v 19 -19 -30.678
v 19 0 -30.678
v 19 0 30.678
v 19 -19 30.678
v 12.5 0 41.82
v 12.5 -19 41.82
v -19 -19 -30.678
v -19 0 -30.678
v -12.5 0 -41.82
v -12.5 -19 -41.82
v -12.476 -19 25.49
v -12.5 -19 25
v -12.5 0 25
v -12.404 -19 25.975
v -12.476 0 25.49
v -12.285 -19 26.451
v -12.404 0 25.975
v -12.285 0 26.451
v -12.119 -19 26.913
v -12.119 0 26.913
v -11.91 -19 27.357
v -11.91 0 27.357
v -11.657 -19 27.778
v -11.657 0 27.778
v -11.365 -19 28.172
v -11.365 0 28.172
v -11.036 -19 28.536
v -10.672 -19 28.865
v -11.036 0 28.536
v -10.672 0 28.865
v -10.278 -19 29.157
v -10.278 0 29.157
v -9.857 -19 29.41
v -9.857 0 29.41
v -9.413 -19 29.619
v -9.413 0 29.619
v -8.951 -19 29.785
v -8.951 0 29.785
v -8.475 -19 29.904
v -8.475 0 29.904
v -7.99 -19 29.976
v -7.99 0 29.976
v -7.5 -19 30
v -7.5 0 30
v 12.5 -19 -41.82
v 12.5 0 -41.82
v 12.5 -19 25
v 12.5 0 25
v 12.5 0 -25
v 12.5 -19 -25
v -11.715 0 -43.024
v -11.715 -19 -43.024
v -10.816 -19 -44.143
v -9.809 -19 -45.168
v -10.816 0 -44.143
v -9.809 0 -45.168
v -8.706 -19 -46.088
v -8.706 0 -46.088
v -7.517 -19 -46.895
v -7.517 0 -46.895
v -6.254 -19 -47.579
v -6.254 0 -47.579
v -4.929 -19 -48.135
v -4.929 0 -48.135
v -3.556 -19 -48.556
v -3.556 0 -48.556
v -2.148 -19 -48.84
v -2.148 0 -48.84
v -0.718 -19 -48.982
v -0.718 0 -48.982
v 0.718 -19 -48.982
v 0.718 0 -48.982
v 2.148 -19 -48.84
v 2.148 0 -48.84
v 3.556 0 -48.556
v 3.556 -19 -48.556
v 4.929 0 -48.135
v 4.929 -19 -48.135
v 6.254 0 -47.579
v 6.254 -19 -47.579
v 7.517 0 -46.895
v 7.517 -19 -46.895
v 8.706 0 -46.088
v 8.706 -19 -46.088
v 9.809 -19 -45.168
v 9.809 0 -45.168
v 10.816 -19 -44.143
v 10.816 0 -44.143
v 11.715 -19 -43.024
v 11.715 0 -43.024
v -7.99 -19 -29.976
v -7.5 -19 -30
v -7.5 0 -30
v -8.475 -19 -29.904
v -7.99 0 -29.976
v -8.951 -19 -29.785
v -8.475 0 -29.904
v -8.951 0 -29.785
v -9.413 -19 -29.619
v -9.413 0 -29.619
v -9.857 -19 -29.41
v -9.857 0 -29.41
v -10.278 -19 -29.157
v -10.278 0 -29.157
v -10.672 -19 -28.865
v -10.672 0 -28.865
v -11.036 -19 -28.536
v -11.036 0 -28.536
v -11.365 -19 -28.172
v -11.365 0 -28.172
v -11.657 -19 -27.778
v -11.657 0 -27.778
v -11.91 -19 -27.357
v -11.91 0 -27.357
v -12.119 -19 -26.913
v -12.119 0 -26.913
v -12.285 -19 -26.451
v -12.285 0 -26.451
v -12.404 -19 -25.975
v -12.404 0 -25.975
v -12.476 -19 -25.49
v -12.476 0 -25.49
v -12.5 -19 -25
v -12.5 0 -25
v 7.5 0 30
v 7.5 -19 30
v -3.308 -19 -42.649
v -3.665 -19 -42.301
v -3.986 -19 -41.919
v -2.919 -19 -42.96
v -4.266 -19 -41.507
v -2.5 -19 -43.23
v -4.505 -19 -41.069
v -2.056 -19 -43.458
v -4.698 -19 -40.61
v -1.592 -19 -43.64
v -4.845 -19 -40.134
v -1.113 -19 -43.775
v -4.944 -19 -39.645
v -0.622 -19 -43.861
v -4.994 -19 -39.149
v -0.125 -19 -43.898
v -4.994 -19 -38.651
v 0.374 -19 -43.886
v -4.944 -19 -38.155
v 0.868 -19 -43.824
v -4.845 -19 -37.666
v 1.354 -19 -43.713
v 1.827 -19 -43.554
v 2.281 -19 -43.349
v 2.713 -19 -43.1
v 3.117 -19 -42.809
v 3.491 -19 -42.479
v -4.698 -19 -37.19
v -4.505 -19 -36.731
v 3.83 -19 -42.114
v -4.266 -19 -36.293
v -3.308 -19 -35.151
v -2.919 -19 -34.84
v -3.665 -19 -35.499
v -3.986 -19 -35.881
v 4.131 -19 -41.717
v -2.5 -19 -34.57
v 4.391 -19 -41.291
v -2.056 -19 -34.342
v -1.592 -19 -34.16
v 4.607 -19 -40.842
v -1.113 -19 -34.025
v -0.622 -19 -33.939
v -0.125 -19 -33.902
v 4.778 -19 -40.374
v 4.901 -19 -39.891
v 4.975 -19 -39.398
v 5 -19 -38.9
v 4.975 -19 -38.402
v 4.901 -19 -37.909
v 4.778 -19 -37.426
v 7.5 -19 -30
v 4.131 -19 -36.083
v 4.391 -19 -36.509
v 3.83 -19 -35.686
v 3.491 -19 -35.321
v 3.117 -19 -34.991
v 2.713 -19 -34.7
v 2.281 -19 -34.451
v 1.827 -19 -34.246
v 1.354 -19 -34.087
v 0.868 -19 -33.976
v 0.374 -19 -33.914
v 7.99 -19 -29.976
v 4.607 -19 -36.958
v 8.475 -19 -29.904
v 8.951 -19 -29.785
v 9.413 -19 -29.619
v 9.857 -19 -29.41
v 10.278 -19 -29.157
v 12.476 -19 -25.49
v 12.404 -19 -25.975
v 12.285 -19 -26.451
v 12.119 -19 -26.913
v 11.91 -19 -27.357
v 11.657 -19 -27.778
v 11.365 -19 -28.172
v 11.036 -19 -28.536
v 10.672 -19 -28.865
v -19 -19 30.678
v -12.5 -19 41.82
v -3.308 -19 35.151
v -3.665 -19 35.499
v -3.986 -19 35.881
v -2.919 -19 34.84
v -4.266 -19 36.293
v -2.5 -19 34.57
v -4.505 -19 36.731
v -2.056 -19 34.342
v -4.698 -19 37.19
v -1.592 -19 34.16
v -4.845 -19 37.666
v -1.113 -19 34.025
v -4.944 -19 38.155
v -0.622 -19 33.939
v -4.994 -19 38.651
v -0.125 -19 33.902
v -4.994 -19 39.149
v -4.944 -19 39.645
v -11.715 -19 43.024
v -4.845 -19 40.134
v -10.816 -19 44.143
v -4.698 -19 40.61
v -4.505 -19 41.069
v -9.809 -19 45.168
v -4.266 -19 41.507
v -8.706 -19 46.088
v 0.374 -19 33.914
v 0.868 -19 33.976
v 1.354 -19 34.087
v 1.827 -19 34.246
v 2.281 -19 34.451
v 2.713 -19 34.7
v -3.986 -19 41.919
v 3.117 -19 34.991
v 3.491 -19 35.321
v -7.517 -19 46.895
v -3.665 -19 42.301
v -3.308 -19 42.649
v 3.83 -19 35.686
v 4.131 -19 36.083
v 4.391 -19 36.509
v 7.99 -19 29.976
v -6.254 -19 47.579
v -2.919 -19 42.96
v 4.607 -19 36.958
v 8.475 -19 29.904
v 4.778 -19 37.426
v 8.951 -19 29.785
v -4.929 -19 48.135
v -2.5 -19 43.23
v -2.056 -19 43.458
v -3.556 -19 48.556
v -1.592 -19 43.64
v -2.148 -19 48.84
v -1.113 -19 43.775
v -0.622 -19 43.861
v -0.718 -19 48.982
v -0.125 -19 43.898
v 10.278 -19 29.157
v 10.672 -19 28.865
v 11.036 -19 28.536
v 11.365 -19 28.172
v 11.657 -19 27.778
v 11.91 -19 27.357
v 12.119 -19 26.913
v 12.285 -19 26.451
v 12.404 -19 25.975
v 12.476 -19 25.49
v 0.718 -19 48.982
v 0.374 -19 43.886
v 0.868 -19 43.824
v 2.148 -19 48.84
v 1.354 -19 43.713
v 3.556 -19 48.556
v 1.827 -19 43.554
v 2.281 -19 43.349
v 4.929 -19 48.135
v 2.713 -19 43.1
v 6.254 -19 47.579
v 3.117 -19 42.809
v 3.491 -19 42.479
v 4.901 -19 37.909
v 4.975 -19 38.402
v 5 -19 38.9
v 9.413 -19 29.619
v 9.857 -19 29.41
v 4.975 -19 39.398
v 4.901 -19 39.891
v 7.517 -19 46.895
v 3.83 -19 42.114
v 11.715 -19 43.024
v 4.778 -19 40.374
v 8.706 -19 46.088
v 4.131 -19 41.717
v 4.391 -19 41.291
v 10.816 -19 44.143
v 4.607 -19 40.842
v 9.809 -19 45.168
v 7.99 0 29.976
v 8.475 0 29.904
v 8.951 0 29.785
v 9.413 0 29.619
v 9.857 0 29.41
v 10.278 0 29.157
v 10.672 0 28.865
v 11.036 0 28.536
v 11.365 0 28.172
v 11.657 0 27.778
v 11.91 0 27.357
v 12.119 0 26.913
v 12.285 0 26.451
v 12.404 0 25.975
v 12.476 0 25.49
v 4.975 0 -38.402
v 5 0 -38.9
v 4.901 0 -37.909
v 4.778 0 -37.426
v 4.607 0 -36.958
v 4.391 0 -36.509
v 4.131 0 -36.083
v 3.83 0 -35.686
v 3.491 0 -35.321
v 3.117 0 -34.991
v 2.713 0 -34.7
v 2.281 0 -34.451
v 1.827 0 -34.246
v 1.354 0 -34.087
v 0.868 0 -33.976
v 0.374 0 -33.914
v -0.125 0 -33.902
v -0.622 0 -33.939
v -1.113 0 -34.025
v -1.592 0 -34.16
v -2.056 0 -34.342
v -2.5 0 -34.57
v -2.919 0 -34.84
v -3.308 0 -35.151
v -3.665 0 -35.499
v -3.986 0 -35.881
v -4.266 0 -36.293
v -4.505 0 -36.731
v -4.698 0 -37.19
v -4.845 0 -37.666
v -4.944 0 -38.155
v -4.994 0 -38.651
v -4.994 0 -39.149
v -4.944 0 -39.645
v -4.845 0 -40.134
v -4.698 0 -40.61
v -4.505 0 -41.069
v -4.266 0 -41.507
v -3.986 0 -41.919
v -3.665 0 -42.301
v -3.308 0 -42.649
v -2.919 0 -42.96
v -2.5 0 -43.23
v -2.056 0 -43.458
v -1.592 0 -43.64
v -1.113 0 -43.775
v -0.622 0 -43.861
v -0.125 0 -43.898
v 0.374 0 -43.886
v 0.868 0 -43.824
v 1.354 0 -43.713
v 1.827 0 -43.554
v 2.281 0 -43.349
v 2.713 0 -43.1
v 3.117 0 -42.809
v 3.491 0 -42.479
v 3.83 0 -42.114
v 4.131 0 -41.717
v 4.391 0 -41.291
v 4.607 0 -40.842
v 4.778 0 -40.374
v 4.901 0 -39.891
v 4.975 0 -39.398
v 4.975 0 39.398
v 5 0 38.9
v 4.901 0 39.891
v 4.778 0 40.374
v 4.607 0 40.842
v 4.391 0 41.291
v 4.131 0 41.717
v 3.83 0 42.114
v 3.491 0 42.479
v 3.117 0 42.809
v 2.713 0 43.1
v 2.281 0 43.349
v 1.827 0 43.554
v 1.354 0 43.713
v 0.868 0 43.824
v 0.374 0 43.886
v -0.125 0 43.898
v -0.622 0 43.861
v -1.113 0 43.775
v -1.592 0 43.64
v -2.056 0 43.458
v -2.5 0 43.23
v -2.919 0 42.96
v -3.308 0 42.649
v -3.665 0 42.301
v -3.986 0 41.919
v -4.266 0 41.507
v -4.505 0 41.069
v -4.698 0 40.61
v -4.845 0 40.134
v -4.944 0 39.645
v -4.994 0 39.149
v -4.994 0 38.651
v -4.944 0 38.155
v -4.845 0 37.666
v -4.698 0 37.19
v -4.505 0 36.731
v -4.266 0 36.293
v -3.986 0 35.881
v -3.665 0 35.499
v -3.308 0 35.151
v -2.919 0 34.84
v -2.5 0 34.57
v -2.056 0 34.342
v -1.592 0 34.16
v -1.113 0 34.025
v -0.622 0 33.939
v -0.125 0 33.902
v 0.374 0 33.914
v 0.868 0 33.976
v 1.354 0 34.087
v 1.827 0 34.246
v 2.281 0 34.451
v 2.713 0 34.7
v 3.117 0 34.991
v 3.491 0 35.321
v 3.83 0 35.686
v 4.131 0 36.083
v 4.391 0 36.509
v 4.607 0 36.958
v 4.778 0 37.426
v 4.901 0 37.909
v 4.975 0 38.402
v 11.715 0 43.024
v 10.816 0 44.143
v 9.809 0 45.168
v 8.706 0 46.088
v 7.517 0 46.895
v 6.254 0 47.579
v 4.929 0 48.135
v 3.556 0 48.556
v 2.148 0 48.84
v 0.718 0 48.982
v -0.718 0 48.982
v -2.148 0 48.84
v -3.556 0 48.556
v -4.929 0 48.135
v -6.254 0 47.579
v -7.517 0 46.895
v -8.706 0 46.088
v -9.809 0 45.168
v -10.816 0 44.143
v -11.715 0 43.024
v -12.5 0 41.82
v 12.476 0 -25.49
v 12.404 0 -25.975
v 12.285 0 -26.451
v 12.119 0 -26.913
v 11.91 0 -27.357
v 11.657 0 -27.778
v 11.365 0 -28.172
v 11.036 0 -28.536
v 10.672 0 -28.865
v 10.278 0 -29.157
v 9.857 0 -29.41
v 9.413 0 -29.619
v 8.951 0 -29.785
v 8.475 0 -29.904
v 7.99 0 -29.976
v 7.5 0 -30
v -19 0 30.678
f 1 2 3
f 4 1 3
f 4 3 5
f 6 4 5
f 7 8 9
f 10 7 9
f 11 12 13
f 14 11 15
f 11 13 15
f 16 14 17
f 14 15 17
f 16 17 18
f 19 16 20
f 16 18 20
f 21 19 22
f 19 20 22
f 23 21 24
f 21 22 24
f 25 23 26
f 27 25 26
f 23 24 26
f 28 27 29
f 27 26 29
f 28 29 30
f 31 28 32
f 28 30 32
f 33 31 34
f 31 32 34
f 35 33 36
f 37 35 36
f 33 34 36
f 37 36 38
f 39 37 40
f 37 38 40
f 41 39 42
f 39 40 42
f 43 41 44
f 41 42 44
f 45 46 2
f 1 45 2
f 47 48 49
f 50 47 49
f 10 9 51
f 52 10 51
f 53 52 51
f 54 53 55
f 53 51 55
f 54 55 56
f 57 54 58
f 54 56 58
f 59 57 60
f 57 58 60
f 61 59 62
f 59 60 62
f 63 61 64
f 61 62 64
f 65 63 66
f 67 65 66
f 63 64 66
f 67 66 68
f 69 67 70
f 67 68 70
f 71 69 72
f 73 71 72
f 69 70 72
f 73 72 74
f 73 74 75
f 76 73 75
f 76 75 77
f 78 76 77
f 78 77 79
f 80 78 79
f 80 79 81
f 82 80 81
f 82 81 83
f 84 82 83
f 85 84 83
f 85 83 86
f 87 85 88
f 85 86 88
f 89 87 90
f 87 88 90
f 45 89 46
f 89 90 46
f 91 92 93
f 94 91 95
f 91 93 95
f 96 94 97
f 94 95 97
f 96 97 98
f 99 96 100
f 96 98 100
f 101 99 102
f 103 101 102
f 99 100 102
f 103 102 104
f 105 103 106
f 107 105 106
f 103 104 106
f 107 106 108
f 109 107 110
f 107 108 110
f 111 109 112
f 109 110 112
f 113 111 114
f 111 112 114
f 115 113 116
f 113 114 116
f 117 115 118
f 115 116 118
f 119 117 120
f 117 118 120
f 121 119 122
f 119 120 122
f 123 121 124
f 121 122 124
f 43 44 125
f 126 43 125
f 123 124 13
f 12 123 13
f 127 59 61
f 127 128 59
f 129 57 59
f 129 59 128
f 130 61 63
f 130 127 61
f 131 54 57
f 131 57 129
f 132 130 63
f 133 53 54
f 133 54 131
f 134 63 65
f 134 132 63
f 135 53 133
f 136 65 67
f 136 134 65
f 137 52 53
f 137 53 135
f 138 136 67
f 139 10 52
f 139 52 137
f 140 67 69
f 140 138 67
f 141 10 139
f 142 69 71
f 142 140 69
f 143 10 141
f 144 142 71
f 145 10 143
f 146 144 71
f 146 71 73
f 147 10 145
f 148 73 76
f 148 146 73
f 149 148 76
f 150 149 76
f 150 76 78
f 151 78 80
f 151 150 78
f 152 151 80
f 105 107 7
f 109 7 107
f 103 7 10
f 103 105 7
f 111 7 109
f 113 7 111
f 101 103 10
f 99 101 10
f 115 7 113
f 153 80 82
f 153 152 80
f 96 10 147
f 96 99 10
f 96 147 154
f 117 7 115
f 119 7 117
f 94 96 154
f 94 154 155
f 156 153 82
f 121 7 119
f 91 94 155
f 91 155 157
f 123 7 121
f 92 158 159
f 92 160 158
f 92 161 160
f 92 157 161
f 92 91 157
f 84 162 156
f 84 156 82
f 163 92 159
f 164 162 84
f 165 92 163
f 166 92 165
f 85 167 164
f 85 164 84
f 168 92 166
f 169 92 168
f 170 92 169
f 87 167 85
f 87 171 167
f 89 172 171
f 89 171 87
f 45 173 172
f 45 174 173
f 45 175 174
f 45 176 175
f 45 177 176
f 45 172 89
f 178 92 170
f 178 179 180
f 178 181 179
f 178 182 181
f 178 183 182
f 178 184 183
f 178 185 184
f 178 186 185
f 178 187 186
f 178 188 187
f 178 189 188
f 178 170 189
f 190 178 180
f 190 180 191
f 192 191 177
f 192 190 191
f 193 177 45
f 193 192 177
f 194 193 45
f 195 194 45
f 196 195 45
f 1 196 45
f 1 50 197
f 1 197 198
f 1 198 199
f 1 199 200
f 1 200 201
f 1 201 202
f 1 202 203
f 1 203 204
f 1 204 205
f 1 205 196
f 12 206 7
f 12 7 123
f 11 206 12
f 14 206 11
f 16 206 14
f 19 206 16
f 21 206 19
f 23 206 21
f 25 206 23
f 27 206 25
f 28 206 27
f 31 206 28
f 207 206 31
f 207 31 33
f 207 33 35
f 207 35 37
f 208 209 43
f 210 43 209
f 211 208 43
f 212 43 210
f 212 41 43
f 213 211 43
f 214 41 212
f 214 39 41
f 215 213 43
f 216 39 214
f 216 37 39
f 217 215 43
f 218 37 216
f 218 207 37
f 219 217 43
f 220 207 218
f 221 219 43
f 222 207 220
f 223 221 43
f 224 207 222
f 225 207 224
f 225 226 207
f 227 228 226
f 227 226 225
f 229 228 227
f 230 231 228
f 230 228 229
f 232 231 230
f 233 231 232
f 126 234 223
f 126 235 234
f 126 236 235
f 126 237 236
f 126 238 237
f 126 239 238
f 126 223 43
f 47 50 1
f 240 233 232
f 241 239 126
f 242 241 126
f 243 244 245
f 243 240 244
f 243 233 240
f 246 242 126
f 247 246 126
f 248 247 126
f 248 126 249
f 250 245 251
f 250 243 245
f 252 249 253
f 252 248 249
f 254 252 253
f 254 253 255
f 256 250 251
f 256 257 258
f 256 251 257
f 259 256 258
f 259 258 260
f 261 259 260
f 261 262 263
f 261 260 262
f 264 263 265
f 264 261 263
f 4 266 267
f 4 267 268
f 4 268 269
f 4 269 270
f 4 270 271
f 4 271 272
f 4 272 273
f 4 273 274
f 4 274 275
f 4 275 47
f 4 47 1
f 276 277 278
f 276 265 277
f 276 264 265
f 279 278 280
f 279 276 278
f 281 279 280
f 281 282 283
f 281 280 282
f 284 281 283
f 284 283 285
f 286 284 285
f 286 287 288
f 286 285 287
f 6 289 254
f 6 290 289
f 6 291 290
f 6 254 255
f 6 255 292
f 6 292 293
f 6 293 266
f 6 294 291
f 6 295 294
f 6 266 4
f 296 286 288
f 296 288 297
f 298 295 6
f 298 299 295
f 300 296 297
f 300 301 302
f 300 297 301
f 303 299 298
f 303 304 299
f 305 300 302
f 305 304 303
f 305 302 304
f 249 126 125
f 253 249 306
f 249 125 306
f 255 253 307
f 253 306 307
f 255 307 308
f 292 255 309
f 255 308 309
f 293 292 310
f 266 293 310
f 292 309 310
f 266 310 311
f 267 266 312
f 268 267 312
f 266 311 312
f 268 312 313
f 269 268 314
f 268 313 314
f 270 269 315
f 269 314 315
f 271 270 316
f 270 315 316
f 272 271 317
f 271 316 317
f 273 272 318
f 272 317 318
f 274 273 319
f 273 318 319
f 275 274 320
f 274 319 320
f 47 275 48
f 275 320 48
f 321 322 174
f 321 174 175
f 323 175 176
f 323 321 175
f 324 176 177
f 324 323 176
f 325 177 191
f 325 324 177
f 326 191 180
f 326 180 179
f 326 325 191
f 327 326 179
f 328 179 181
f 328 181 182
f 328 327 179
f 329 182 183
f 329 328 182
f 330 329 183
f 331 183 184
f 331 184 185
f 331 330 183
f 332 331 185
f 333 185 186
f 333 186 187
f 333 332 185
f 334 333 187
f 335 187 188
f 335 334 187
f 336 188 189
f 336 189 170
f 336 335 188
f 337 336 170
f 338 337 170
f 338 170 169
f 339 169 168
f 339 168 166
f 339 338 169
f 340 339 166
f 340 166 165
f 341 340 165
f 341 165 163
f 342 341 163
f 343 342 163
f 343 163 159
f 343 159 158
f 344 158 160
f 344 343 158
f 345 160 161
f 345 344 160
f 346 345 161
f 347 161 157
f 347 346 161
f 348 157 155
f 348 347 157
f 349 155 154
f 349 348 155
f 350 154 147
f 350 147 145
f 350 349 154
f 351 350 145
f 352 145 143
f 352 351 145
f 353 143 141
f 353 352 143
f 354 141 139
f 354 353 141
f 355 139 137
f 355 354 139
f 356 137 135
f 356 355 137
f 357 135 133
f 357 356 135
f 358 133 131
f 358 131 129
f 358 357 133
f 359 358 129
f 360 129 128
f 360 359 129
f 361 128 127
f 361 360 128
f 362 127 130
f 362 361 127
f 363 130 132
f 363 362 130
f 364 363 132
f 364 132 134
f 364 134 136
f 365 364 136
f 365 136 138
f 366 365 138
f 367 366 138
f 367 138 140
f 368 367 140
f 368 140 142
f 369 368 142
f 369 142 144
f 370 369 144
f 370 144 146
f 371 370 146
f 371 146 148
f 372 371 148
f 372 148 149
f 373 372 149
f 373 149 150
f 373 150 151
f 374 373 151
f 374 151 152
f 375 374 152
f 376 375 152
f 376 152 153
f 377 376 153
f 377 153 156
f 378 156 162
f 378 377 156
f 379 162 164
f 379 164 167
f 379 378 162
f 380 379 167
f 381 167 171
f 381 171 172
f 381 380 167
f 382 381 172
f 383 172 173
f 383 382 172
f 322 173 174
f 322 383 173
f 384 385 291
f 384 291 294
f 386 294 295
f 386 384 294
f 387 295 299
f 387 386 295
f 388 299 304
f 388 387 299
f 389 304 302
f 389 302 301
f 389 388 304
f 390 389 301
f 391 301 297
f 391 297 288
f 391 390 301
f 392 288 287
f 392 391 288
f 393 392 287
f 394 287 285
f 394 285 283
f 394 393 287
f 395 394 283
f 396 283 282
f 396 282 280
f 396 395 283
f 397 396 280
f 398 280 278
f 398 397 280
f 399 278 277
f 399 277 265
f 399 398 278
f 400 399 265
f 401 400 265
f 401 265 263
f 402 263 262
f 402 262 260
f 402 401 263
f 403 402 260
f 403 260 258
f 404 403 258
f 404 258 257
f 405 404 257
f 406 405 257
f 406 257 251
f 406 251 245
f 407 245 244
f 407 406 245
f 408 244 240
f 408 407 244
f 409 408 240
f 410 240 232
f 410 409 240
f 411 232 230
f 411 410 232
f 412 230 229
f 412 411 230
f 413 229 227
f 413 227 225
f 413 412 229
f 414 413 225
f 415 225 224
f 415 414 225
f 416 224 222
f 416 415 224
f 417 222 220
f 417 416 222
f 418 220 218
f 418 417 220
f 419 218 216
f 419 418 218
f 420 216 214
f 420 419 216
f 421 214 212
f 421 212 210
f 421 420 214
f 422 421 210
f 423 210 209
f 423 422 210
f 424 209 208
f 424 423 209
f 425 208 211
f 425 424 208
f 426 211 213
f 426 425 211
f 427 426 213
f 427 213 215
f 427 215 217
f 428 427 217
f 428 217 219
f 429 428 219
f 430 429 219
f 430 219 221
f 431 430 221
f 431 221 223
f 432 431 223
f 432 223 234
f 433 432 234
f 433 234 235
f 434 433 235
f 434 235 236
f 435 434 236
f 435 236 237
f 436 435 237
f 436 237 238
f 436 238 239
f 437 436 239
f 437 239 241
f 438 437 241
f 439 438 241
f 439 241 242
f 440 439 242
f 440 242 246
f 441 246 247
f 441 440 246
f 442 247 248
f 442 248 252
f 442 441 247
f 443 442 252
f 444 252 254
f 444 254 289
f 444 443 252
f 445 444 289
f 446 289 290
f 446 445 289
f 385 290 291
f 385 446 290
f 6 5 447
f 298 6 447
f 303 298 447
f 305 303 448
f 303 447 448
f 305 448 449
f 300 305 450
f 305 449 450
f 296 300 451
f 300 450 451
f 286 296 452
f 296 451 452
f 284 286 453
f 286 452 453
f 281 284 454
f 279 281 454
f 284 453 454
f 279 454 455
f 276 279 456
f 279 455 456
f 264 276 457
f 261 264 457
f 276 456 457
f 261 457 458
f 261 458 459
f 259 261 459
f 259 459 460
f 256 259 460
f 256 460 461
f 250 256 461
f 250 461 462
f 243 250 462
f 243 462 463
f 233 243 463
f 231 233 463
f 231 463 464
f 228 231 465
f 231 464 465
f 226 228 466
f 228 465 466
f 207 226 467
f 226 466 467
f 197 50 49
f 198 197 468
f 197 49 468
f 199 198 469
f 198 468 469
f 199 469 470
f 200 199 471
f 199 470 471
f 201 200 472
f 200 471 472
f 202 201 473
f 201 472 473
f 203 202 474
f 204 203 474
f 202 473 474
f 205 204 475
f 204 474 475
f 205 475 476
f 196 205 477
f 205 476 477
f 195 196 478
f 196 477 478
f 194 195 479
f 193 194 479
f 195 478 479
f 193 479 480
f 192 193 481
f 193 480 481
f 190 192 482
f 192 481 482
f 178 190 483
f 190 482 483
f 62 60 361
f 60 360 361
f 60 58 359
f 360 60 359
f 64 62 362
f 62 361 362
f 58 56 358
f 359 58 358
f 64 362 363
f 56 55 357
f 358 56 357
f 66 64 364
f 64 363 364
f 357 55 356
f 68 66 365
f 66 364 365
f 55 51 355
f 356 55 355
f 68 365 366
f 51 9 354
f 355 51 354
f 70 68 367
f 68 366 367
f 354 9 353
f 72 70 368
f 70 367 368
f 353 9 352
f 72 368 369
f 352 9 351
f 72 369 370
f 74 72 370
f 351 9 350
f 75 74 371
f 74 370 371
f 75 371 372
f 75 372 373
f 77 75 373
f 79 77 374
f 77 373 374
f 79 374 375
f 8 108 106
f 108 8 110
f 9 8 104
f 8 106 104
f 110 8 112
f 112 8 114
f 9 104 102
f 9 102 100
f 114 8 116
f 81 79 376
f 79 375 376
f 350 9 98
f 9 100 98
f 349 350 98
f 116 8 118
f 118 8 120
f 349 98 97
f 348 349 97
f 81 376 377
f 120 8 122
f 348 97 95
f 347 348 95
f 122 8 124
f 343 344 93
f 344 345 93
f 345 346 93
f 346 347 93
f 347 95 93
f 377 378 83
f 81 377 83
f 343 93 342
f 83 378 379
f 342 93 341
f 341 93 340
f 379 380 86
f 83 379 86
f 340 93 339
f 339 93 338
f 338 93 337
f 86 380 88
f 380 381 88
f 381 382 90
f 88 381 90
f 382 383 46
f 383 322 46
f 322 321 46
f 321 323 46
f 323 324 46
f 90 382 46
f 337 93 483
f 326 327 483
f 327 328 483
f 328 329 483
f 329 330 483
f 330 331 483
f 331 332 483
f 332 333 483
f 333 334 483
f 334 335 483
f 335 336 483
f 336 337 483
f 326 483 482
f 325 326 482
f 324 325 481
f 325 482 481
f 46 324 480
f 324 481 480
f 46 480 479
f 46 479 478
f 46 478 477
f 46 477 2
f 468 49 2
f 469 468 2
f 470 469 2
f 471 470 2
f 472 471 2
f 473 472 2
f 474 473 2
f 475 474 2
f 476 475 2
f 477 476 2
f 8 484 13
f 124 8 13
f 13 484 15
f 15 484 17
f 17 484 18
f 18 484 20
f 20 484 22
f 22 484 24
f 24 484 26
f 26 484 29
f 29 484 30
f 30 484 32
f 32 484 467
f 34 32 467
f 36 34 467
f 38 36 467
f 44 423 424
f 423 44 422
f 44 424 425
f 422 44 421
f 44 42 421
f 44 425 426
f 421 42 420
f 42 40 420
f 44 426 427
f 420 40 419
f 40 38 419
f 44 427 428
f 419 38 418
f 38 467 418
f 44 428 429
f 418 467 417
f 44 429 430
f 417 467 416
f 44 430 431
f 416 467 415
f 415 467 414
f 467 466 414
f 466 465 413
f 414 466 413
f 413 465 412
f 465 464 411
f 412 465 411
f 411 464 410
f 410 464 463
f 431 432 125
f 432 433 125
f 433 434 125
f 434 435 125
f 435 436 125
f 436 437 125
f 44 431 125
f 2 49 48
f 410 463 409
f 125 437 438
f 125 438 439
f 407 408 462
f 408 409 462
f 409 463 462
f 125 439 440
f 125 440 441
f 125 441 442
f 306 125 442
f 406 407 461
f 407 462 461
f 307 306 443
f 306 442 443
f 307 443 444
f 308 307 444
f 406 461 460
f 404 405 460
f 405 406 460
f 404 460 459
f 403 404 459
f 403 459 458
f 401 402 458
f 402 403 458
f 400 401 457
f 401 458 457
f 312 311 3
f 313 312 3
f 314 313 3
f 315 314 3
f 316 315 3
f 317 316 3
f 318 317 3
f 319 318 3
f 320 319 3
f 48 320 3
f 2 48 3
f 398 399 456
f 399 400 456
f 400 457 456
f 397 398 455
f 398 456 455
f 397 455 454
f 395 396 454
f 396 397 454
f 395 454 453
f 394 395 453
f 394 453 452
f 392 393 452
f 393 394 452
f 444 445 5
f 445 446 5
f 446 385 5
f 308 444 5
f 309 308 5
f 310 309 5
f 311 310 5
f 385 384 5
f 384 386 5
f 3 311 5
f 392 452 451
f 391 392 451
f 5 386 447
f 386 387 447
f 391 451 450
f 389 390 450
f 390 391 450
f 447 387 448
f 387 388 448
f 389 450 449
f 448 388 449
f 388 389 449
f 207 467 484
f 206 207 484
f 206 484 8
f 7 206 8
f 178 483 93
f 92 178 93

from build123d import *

# Parameters (mm, degrees)
F0_R     = 5
F1_DEPTH = 19


with BuildPart() as f1:
    # F0 (on Front) → F1 (new body)
    with BuildSketch(Plane.XZ):
        with BuildLine():
            Line((-12.5, 41.820371), (-19, 30.677514))
            Line((-19, 30.677514), (-19, 0))
            Line((-19, 0), (-19, -30.677514))
            Line((-19, -30.677514), (-12.5, -41.820371))
            ThreePointArc((-12.5, -41.820371), (0, -49), (12.5, -41.820371))
            Line((12.5, -41.820371), (19, -30.677514))
            Line((19, -30.677514), (19, 0))
            Line((19, 0), (19, 30.677514))
            Line((19, 30.677514), (12.5, 41.820371))
            ThreePointArc((12.5, 41.820371), (0, 49), (-12.5, 41.820371))
        make_face()
        with Locations((0, -38.9)):
            Circle(F0_R, mode=Mode.SUBTRACT)
        with BuildLine():
            Line((-12.5, -25), (-12.5, 0))
            Line((-12.5, 0), (-12.5, 25))
            ThreePointArc((-12.5, 25), (-11.035534, 28.535534), (-7.5, 30))
            Line((-7.5, 30), (0, 30))
            Line((0, 30), (7.5, 30))
            ThreePointArc((7.5, 30), (11.035534, 28.535534), (12.5, 25))
            Line((12.5, 25), (12.5, 0))
            Line((12.5, 0), (12.5, -25))
            ThreePointArc((12.5, -25), (11.035534, -28.535534), (7.5, -30))
            Line((7.5, -30), (0, -30))
            Line((0, -30), (-7.5, -30))
            ThreePointArc((-7.5, -30), (-11.035534, -28.535534), (-12.5, -25))
        make_face(mode=Mode.SUBTRACT)
        with Locations((0, 38.9)):
            Circle(F0_R, mode=Mode.SUBTRACT)
    extrude(amount=F1_DEPTH)


solid = f1.part
